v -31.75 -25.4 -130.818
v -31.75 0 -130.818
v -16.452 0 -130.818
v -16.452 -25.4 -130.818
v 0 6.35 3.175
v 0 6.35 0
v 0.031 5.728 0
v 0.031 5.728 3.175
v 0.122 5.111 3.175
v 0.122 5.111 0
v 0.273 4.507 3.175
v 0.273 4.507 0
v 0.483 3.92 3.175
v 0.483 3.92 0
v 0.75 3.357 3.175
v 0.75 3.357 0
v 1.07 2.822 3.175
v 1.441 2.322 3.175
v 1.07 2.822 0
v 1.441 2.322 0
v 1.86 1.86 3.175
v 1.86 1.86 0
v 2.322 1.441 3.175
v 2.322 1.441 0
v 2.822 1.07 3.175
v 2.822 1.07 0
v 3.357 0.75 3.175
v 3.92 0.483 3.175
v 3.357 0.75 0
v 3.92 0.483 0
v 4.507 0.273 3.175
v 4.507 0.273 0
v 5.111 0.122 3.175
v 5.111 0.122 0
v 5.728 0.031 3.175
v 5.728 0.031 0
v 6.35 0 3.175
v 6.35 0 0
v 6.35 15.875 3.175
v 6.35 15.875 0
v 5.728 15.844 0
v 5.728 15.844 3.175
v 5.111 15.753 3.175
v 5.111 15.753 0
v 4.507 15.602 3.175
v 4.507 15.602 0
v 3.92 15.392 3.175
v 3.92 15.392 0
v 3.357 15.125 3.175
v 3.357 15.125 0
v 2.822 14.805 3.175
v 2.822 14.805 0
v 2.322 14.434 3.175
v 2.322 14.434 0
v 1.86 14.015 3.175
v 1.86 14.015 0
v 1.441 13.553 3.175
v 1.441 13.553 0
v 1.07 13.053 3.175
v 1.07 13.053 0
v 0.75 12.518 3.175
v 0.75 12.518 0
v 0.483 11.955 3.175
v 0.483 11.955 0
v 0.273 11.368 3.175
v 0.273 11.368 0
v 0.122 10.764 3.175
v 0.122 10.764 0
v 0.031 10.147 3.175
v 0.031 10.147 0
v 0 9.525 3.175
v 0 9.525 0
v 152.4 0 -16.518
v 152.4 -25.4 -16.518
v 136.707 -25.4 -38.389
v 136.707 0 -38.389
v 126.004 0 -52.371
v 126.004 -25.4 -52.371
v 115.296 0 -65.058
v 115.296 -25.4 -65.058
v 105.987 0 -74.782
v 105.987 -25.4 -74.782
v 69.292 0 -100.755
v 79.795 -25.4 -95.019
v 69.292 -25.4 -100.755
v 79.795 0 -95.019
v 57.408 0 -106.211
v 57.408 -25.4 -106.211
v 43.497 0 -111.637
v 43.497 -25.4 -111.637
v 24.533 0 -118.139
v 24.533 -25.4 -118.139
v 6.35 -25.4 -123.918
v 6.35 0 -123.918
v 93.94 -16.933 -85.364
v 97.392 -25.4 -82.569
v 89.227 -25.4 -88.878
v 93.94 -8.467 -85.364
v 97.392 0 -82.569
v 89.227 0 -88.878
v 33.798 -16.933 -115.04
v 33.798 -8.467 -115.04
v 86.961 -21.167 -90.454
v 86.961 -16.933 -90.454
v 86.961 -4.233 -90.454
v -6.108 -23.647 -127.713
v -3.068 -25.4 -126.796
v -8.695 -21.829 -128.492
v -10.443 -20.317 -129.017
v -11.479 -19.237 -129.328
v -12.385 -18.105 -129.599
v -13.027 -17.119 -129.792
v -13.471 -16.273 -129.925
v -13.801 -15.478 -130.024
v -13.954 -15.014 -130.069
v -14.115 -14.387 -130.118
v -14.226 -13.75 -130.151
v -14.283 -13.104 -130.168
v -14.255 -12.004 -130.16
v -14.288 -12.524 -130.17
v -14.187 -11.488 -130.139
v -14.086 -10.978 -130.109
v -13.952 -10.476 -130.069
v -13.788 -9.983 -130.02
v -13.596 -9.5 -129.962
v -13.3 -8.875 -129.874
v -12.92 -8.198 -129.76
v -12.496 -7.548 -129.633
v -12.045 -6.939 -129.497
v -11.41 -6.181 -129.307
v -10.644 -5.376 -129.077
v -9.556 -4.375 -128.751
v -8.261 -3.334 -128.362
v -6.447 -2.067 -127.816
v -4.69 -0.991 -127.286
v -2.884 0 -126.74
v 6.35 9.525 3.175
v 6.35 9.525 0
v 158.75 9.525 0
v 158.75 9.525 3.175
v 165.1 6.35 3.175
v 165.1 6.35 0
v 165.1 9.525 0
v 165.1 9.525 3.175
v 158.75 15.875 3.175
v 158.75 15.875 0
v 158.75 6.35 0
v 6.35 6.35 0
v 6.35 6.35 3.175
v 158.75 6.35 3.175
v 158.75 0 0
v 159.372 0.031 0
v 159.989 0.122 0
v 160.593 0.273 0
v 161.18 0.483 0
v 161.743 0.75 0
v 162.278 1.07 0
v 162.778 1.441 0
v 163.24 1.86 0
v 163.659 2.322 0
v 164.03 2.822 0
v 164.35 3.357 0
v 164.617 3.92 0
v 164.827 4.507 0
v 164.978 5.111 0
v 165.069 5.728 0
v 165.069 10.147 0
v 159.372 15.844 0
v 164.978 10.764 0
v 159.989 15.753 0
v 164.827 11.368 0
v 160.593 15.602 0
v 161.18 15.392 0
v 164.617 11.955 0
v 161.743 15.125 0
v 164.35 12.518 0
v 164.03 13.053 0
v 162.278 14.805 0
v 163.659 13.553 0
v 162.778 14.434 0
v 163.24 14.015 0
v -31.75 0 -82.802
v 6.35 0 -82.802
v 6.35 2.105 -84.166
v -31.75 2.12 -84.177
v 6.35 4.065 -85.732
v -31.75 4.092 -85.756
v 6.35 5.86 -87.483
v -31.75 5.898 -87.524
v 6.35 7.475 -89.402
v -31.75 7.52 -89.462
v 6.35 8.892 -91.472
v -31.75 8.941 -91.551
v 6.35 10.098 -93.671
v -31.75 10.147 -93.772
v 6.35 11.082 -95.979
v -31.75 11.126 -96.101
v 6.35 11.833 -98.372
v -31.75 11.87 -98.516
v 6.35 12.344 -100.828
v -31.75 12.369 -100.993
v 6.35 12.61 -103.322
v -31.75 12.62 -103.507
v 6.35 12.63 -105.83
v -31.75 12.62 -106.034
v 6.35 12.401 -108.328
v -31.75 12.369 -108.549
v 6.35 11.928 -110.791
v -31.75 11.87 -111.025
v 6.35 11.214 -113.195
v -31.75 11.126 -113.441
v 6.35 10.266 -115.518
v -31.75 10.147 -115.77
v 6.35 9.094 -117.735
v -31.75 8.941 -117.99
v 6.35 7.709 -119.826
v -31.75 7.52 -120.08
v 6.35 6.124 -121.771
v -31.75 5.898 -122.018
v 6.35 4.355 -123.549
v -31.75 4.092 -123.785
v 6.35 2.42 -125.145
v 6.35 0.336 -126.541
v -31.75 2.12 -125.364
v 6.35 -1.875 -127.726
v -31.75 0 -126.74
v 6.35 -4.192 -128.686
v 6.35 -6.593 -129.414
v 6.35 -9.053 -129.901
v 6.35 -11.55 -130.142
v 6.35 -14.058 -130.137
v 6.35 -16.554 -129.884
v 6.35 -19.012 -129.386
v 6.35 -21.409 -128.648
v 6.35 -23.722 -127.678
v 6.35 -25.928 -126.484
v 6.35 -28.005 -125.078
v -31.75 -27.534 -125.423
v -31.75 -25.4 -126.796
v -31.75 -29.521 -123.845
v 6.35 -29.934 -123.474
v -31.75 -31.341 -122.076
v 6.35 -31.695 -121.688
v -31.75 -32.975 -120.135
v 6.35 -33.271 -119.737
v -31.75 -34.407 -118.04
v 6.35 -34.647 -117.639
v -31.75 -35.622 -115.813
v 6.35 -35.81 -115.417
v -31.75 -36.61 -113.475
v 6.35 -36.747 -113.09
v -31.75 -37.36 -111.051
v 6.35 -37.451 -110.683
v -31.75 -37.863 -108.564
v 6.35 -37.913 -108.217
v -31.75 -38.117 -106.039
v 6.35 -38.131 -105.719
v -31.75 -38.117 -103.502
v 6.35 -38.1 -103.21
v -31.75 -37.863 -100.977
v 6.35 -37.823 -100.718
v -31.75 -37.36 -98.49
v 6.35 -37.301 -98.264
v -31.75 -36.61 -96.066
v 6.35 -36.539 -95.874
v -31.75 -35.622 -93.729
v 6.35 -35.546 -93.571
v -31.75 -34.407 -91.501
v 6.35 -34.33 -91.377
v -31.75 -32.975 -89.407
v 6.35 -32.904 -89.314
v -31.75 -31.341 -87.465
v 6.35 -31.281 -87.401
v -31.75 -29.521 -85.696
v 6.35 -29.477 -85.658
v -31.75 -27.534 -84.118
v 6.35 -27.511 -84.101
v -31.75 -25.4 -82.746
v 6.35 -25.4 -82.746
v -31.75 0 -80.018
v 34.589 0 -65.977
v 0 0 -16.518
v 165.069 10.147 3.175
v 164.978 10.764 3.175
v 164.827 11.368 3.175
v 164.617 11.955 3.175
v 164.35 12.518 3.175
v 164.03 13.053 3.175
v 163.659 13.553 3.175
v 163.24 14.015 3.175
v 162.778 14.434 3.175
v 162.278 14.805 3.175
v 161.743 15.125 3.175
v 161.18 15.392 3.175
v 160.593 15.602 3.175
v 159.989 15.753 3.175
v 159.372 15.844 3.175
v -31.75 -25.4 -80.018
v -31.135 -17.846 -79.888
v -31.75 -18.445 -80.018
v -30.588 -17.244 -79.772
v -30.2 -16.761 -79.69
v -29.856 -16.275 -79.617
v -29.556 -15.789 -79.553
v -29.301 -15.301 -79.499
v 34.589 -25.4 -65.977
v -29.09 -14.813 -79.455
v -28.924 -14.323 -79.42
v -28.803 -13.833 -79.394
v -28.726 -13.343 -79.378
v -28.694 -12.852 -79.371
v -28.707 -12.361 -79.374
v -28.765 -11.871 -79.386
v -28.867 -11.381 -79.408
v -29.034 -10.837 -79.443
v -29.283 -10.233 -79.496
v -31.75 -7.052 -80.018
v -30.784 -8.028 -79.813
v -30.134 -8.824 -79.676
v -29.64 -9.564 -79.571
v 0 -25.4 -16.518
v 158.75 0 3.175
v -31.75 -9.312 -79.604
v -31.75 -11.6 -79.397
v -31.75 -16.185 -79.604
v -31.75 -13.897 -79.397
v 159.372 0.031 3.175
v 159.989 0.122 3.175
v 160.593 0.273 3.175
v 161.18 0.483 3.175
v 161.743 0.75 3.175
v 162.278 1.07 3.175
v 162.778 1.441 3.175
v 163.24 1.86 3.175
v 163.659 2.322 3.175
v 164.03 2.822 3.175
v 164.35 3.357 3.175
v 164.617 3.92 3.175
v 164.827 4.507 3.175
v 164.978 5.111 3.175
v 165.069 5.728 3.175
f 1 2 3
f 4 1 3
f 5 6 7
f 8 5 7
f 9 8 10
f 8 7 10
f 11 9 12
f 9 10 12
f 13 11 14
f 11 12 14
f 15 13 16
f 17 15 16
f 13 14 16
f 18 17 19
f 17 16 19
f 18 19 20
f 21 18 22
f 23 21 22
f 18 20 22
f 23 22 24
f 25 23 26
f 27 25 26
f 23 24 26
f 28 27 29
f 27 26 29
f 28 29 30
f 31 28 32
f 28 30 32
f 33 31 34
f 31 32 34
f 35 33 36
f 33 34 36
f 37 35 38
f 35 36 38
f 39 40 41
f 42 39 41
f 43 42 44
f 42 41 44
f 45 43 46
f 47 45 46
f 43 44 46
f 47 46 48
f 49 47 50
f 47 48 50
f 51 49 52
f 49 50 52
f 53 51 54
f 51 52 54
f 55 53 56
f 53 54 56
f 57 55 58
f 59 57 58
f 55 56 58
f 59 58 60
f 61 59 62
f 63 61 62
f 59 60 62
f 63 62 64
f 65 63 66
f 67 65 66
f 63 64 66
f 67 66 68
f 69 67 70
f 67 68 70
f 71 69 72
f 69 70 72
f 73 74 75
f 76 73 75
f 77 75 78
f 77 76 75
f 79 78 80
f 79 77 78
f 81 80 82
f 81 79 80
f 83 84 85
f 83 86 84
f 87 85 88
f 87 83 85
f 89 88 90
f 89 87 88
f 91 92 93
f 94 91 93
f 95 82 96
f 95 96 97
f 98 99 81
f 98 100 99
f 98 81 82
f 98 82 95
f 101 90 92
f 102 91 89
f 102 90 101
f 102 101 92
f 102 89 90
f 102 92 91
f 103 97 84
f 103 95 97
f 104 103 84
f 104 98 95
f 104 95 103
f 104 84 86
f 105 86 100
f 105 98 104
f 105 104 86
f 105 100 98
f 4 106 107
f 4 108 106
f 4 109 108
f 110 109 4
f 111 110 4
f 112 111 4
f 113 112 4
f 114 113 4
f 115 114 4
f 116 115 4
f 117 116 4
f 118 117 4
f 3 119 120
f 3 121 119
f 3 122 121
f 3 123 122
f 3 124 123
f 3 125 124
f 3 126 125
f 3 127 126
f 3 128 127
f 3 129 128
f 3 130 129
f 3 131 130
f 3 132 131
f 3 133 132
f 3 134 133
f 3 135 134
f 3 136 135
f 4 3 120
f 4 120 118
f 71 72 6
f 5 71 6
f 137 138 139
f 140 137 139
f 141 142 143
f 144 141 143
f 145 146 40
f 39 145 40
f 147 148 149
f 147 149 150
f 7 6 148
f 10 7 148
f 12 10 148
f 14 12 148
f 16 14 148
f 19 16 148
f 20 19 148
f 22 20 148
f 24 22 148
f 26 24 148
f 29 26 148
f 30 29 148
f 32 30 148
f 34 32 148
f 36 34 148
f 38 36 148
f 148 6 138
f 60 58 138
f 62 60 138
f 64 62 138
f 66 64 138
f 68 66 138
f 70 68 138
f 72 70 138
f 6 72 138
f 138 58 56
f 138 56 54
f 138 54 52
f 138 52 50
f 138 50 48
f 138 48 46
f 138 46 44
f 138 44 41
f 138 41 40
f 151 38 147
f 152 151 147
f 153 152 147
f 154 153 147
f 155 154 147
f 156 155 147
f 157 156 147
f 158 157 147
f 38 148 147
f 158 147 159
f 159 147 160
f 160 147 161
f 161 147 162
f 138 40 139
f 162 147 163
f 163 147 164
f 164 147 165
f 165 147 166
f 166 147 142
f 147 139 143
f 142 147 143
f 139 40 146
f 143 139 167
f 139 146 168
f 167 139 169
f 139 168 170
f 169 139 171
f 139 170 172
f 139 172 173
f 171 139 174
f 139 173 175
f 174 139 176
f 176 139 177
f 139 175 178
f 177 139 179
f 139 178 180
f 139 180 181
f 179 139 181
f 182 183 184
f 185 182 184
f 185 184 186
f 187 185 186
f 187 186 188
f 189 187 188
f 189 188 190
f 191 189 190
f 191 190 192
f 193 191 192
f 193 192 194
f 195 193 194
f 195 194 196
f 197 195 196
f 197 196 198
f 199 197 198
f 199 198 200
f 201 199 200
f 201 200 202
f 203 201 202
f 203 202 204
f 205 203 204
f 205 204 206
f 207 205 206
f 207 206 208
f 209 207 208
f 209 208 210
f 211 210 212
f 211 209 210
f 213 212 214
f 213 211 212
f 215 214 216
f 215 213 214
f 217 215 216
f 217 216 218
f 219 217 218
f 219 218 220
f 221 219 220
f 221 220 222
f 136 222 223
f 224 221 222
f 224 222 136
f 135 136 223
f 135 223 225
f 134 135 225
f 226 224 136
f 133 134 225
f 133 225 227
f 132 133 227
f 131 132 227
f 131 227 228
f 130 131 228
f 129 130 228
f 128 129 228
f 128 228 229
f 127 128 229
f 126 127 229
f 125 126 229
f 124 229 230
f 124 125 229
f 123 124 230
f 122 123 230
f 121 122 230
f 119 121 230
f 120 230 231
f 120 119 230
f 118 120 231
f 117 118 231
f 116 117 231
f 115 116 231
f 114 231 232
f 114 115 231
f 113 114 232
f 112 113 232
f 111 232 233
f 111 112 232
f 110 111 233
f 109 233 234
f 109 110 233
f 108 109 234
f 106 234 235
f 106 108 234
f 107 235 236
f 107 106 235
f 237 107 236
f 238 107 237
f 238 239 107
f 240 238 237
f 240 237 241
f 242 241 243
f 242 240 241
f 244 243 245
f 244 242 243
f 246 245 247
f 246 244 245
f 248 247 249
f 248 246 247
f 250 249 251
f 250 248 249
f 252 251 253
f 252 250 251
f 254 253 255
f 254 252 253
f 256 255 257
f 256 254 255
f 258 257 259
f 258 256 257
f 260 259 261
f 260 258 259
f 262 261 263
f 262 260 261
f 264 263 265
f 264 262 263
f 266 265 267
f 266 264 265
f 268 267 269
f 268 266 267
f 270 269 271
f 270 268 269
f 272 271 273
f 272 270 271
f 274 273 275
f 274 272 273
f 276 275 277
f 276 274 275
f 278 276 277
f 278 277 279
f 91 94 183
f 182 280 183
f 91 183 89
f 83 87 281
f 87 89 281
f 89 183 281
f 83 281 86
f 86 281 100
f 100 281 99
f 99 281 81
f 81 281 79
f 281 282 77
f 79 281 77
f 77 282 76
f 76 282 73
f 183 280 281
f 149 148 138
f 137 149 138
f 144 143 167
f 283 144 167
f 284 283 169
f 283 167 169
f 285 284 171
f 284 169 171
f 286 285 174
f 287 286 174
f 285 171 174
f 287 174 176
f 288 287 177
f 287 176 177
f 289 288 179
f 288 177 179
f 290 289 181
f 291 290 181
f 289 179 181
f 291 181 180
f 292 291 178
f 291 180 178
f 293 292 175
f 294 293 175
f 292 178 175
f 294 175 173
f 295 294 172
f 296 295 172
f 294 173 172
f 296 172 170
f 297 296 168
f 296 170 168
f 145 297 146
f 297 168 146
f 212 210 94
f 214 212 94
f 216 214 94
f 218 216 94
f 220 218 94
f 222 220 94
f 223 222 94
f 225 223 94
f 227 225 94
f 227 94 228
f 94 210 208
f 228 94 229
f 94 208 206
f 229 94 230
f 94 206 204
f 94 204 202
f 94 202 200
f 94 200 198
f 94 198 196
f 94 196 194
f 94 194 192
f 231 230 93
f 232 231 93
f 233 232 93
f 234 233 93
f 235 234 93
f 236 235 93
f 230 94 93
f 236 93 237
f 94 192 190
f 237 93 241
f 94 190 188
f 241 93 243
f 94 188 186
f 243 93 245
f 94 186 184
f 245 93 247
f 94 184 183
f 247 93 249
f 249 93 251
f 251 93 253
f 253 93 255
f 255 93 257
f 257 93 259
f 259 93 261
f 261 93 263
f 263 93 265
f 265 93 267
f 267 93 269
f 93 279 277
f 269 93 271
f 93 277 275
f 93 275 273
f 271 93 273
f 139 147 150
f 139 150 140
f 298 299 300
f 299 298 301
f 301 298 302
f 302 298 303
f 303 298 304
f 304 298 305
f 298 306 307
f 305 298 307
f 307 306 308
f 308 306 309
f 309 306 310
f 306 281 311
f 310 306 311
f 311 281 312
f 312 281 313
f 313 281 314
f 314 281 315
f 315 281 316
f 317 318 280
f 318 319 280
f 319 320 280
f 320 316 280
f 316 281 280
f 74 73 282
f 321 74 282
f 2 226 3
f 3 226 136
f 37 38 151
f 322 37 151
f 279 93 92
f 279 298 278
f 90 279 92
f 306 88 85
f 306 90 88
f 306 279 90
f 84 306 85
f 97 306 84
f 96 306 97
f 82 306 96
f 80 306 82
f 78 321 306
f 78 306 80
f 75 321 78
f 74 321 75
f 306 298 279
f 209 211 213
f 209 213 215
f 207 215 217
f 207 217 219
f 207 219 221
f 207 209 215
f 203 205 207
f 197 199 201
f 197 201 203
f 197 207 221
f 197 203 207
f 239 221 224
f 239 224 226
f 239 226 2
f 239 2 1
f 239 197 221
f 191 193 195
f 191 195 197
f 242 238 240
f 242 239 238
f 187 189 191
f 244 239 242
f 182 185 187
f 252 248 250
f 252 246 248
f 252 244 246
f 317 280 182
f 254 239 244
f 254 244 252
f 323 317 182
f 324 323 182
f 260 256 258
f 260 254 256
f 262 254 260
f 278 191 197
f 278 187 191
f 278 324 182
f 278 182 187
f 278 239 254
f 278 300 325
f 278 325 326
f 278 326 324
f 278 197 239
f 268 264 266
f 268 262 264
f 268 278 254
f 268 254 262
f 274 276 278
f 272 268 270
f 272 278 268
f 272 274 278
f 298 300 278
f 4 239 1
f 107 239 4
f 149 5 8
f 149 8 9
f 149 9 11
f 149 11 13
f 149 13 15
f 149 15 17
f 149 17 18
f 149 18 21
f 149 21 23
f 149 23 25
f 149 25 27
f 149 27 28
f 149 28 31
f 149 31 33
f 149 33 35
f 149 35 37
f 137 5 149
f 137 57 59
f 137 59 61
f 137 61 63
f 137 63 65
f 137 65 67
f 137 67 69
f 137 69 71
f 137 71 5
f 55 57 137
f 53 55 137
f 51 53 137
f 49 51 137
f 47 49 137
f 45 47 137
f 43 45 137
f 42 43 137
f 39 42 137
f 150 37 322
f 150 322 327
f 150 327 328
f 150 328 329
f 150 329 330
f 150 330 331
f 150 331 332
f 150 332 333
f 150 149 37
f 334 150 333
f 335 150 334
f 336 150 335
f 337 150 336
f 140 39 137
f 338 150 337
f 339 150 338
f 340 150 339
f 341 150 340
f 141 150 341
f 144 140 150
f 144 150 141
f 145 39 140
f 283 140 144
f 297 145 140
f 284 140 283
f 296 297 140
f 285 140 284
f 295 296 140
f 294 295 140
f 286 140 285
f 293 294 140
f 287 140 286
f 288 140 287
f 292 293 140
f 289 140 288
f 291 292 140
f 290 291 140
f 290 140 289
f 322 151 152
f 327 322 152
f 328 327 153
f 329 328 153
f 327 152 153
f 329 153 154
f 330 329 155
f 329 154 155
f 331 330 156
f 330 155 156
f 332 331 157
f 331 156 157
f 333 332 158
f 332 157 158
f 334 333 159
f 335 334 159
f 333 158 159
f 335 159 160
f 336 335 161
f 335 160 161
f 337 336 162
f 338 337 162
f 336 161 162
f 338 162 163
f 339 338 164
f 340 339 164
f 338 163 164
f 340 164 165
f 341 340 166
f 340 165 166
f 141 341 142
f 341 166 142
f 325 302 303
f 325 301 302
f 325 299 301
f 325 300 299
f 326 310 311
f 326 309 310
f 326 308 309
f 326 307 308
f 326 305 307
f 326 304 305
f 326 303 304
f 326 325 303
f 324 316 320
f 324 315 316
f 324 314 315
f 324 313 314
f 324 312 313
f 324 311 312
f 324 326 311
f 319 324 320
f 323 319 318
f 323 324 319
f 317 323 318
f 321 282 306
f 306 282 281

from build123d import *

# Parameters (mm, degrees)
F0_W     = 152.4
F0_H     = 3.175
F1_DEPTH = 3.175
F3_DEPTH = 25.4
F4_R     = 25.4
F5_DEPTH = 38.1


with BuildPart() as f1:
    # F0 (on Top) → F1 (new body)
    with BuildSketch(Plane.XY):
        with BuildLine():
            ThreePointArc((0, 6.35), (1.8598719395, 1.8598719395), (6.35, 0))
            Line((6.35, 0), (158.75, 0))
            ThreePointArc((158.75, 0), (163.2401280605, 1.8598719395), (165.1, 6.35))
            Line((165.1, 6.35), (165.1, 9.525))
            ThreePointArc((165.1, 9.525), (163.2401280605, 14.0151280605), (158.75, 15.875))
            Line((158.75, 15.875), (6.35, 15.875))
            ThreePointArc((6.35, 15.875), (1.8598719395, 14.0151280605), (0, 9.525))
            Line((0, 9.525), (0, 6.35))
        make_face()
        with Locations((82.55, 7.9375)):
            Rectangle(F0_W, F0_H, mode=Mode.SUBTRACT)
    extrude(amount=F1_DEPTH)


with BuildPart() as f3:
    # F2 (on Front) → F3 (new body)
    with BuildSketch(Plane.XZ):
        with BuildLine():
            Line((152.4, -16.5177099407), (0, -16.5177099407))
            Line((0, -16.5177099407), (34.5891490579, -65.9765824676))
            Line((34.5891490579, -65.9765824676), (-31.75, -80.0177099407))
            Line((-31.75, -80.0177099407), (-31.75, -130.8177099407))
            Line((-31.75, -130.8177099407), (-16.452409327, -130.8177099407))
            add(Edge.make_bspline(
                [(152.4, -16.5177099407), (134.0951380327, -42.4000578135), (100.0168941161, -90.5853413475), (34.6307022377, -115.5229748023), (-0.1236675502, -125.928740319), (-16.452409327, -130.8177099407)],
                knots=[0, 0, 0, 0, 0.3809023627, 0.709127643, 1, 1, 1, 1], degree=3))
        make_face()
    extrude(amount=F3_DEPTH)

    # F4 (on face) → F5 (join)
    with BuildSketch(Plane(origin=(-31.75, 0, 0), x_dir=(0, -1, 0), z_dir=(-1, 0, 0))):
        with Locations((12.7482553944, -104.7707274556)):
            Circle(F4_R)
    extrude(amount=-F5_DEPTH)


solid = Compound([f1.part, f3.part])
